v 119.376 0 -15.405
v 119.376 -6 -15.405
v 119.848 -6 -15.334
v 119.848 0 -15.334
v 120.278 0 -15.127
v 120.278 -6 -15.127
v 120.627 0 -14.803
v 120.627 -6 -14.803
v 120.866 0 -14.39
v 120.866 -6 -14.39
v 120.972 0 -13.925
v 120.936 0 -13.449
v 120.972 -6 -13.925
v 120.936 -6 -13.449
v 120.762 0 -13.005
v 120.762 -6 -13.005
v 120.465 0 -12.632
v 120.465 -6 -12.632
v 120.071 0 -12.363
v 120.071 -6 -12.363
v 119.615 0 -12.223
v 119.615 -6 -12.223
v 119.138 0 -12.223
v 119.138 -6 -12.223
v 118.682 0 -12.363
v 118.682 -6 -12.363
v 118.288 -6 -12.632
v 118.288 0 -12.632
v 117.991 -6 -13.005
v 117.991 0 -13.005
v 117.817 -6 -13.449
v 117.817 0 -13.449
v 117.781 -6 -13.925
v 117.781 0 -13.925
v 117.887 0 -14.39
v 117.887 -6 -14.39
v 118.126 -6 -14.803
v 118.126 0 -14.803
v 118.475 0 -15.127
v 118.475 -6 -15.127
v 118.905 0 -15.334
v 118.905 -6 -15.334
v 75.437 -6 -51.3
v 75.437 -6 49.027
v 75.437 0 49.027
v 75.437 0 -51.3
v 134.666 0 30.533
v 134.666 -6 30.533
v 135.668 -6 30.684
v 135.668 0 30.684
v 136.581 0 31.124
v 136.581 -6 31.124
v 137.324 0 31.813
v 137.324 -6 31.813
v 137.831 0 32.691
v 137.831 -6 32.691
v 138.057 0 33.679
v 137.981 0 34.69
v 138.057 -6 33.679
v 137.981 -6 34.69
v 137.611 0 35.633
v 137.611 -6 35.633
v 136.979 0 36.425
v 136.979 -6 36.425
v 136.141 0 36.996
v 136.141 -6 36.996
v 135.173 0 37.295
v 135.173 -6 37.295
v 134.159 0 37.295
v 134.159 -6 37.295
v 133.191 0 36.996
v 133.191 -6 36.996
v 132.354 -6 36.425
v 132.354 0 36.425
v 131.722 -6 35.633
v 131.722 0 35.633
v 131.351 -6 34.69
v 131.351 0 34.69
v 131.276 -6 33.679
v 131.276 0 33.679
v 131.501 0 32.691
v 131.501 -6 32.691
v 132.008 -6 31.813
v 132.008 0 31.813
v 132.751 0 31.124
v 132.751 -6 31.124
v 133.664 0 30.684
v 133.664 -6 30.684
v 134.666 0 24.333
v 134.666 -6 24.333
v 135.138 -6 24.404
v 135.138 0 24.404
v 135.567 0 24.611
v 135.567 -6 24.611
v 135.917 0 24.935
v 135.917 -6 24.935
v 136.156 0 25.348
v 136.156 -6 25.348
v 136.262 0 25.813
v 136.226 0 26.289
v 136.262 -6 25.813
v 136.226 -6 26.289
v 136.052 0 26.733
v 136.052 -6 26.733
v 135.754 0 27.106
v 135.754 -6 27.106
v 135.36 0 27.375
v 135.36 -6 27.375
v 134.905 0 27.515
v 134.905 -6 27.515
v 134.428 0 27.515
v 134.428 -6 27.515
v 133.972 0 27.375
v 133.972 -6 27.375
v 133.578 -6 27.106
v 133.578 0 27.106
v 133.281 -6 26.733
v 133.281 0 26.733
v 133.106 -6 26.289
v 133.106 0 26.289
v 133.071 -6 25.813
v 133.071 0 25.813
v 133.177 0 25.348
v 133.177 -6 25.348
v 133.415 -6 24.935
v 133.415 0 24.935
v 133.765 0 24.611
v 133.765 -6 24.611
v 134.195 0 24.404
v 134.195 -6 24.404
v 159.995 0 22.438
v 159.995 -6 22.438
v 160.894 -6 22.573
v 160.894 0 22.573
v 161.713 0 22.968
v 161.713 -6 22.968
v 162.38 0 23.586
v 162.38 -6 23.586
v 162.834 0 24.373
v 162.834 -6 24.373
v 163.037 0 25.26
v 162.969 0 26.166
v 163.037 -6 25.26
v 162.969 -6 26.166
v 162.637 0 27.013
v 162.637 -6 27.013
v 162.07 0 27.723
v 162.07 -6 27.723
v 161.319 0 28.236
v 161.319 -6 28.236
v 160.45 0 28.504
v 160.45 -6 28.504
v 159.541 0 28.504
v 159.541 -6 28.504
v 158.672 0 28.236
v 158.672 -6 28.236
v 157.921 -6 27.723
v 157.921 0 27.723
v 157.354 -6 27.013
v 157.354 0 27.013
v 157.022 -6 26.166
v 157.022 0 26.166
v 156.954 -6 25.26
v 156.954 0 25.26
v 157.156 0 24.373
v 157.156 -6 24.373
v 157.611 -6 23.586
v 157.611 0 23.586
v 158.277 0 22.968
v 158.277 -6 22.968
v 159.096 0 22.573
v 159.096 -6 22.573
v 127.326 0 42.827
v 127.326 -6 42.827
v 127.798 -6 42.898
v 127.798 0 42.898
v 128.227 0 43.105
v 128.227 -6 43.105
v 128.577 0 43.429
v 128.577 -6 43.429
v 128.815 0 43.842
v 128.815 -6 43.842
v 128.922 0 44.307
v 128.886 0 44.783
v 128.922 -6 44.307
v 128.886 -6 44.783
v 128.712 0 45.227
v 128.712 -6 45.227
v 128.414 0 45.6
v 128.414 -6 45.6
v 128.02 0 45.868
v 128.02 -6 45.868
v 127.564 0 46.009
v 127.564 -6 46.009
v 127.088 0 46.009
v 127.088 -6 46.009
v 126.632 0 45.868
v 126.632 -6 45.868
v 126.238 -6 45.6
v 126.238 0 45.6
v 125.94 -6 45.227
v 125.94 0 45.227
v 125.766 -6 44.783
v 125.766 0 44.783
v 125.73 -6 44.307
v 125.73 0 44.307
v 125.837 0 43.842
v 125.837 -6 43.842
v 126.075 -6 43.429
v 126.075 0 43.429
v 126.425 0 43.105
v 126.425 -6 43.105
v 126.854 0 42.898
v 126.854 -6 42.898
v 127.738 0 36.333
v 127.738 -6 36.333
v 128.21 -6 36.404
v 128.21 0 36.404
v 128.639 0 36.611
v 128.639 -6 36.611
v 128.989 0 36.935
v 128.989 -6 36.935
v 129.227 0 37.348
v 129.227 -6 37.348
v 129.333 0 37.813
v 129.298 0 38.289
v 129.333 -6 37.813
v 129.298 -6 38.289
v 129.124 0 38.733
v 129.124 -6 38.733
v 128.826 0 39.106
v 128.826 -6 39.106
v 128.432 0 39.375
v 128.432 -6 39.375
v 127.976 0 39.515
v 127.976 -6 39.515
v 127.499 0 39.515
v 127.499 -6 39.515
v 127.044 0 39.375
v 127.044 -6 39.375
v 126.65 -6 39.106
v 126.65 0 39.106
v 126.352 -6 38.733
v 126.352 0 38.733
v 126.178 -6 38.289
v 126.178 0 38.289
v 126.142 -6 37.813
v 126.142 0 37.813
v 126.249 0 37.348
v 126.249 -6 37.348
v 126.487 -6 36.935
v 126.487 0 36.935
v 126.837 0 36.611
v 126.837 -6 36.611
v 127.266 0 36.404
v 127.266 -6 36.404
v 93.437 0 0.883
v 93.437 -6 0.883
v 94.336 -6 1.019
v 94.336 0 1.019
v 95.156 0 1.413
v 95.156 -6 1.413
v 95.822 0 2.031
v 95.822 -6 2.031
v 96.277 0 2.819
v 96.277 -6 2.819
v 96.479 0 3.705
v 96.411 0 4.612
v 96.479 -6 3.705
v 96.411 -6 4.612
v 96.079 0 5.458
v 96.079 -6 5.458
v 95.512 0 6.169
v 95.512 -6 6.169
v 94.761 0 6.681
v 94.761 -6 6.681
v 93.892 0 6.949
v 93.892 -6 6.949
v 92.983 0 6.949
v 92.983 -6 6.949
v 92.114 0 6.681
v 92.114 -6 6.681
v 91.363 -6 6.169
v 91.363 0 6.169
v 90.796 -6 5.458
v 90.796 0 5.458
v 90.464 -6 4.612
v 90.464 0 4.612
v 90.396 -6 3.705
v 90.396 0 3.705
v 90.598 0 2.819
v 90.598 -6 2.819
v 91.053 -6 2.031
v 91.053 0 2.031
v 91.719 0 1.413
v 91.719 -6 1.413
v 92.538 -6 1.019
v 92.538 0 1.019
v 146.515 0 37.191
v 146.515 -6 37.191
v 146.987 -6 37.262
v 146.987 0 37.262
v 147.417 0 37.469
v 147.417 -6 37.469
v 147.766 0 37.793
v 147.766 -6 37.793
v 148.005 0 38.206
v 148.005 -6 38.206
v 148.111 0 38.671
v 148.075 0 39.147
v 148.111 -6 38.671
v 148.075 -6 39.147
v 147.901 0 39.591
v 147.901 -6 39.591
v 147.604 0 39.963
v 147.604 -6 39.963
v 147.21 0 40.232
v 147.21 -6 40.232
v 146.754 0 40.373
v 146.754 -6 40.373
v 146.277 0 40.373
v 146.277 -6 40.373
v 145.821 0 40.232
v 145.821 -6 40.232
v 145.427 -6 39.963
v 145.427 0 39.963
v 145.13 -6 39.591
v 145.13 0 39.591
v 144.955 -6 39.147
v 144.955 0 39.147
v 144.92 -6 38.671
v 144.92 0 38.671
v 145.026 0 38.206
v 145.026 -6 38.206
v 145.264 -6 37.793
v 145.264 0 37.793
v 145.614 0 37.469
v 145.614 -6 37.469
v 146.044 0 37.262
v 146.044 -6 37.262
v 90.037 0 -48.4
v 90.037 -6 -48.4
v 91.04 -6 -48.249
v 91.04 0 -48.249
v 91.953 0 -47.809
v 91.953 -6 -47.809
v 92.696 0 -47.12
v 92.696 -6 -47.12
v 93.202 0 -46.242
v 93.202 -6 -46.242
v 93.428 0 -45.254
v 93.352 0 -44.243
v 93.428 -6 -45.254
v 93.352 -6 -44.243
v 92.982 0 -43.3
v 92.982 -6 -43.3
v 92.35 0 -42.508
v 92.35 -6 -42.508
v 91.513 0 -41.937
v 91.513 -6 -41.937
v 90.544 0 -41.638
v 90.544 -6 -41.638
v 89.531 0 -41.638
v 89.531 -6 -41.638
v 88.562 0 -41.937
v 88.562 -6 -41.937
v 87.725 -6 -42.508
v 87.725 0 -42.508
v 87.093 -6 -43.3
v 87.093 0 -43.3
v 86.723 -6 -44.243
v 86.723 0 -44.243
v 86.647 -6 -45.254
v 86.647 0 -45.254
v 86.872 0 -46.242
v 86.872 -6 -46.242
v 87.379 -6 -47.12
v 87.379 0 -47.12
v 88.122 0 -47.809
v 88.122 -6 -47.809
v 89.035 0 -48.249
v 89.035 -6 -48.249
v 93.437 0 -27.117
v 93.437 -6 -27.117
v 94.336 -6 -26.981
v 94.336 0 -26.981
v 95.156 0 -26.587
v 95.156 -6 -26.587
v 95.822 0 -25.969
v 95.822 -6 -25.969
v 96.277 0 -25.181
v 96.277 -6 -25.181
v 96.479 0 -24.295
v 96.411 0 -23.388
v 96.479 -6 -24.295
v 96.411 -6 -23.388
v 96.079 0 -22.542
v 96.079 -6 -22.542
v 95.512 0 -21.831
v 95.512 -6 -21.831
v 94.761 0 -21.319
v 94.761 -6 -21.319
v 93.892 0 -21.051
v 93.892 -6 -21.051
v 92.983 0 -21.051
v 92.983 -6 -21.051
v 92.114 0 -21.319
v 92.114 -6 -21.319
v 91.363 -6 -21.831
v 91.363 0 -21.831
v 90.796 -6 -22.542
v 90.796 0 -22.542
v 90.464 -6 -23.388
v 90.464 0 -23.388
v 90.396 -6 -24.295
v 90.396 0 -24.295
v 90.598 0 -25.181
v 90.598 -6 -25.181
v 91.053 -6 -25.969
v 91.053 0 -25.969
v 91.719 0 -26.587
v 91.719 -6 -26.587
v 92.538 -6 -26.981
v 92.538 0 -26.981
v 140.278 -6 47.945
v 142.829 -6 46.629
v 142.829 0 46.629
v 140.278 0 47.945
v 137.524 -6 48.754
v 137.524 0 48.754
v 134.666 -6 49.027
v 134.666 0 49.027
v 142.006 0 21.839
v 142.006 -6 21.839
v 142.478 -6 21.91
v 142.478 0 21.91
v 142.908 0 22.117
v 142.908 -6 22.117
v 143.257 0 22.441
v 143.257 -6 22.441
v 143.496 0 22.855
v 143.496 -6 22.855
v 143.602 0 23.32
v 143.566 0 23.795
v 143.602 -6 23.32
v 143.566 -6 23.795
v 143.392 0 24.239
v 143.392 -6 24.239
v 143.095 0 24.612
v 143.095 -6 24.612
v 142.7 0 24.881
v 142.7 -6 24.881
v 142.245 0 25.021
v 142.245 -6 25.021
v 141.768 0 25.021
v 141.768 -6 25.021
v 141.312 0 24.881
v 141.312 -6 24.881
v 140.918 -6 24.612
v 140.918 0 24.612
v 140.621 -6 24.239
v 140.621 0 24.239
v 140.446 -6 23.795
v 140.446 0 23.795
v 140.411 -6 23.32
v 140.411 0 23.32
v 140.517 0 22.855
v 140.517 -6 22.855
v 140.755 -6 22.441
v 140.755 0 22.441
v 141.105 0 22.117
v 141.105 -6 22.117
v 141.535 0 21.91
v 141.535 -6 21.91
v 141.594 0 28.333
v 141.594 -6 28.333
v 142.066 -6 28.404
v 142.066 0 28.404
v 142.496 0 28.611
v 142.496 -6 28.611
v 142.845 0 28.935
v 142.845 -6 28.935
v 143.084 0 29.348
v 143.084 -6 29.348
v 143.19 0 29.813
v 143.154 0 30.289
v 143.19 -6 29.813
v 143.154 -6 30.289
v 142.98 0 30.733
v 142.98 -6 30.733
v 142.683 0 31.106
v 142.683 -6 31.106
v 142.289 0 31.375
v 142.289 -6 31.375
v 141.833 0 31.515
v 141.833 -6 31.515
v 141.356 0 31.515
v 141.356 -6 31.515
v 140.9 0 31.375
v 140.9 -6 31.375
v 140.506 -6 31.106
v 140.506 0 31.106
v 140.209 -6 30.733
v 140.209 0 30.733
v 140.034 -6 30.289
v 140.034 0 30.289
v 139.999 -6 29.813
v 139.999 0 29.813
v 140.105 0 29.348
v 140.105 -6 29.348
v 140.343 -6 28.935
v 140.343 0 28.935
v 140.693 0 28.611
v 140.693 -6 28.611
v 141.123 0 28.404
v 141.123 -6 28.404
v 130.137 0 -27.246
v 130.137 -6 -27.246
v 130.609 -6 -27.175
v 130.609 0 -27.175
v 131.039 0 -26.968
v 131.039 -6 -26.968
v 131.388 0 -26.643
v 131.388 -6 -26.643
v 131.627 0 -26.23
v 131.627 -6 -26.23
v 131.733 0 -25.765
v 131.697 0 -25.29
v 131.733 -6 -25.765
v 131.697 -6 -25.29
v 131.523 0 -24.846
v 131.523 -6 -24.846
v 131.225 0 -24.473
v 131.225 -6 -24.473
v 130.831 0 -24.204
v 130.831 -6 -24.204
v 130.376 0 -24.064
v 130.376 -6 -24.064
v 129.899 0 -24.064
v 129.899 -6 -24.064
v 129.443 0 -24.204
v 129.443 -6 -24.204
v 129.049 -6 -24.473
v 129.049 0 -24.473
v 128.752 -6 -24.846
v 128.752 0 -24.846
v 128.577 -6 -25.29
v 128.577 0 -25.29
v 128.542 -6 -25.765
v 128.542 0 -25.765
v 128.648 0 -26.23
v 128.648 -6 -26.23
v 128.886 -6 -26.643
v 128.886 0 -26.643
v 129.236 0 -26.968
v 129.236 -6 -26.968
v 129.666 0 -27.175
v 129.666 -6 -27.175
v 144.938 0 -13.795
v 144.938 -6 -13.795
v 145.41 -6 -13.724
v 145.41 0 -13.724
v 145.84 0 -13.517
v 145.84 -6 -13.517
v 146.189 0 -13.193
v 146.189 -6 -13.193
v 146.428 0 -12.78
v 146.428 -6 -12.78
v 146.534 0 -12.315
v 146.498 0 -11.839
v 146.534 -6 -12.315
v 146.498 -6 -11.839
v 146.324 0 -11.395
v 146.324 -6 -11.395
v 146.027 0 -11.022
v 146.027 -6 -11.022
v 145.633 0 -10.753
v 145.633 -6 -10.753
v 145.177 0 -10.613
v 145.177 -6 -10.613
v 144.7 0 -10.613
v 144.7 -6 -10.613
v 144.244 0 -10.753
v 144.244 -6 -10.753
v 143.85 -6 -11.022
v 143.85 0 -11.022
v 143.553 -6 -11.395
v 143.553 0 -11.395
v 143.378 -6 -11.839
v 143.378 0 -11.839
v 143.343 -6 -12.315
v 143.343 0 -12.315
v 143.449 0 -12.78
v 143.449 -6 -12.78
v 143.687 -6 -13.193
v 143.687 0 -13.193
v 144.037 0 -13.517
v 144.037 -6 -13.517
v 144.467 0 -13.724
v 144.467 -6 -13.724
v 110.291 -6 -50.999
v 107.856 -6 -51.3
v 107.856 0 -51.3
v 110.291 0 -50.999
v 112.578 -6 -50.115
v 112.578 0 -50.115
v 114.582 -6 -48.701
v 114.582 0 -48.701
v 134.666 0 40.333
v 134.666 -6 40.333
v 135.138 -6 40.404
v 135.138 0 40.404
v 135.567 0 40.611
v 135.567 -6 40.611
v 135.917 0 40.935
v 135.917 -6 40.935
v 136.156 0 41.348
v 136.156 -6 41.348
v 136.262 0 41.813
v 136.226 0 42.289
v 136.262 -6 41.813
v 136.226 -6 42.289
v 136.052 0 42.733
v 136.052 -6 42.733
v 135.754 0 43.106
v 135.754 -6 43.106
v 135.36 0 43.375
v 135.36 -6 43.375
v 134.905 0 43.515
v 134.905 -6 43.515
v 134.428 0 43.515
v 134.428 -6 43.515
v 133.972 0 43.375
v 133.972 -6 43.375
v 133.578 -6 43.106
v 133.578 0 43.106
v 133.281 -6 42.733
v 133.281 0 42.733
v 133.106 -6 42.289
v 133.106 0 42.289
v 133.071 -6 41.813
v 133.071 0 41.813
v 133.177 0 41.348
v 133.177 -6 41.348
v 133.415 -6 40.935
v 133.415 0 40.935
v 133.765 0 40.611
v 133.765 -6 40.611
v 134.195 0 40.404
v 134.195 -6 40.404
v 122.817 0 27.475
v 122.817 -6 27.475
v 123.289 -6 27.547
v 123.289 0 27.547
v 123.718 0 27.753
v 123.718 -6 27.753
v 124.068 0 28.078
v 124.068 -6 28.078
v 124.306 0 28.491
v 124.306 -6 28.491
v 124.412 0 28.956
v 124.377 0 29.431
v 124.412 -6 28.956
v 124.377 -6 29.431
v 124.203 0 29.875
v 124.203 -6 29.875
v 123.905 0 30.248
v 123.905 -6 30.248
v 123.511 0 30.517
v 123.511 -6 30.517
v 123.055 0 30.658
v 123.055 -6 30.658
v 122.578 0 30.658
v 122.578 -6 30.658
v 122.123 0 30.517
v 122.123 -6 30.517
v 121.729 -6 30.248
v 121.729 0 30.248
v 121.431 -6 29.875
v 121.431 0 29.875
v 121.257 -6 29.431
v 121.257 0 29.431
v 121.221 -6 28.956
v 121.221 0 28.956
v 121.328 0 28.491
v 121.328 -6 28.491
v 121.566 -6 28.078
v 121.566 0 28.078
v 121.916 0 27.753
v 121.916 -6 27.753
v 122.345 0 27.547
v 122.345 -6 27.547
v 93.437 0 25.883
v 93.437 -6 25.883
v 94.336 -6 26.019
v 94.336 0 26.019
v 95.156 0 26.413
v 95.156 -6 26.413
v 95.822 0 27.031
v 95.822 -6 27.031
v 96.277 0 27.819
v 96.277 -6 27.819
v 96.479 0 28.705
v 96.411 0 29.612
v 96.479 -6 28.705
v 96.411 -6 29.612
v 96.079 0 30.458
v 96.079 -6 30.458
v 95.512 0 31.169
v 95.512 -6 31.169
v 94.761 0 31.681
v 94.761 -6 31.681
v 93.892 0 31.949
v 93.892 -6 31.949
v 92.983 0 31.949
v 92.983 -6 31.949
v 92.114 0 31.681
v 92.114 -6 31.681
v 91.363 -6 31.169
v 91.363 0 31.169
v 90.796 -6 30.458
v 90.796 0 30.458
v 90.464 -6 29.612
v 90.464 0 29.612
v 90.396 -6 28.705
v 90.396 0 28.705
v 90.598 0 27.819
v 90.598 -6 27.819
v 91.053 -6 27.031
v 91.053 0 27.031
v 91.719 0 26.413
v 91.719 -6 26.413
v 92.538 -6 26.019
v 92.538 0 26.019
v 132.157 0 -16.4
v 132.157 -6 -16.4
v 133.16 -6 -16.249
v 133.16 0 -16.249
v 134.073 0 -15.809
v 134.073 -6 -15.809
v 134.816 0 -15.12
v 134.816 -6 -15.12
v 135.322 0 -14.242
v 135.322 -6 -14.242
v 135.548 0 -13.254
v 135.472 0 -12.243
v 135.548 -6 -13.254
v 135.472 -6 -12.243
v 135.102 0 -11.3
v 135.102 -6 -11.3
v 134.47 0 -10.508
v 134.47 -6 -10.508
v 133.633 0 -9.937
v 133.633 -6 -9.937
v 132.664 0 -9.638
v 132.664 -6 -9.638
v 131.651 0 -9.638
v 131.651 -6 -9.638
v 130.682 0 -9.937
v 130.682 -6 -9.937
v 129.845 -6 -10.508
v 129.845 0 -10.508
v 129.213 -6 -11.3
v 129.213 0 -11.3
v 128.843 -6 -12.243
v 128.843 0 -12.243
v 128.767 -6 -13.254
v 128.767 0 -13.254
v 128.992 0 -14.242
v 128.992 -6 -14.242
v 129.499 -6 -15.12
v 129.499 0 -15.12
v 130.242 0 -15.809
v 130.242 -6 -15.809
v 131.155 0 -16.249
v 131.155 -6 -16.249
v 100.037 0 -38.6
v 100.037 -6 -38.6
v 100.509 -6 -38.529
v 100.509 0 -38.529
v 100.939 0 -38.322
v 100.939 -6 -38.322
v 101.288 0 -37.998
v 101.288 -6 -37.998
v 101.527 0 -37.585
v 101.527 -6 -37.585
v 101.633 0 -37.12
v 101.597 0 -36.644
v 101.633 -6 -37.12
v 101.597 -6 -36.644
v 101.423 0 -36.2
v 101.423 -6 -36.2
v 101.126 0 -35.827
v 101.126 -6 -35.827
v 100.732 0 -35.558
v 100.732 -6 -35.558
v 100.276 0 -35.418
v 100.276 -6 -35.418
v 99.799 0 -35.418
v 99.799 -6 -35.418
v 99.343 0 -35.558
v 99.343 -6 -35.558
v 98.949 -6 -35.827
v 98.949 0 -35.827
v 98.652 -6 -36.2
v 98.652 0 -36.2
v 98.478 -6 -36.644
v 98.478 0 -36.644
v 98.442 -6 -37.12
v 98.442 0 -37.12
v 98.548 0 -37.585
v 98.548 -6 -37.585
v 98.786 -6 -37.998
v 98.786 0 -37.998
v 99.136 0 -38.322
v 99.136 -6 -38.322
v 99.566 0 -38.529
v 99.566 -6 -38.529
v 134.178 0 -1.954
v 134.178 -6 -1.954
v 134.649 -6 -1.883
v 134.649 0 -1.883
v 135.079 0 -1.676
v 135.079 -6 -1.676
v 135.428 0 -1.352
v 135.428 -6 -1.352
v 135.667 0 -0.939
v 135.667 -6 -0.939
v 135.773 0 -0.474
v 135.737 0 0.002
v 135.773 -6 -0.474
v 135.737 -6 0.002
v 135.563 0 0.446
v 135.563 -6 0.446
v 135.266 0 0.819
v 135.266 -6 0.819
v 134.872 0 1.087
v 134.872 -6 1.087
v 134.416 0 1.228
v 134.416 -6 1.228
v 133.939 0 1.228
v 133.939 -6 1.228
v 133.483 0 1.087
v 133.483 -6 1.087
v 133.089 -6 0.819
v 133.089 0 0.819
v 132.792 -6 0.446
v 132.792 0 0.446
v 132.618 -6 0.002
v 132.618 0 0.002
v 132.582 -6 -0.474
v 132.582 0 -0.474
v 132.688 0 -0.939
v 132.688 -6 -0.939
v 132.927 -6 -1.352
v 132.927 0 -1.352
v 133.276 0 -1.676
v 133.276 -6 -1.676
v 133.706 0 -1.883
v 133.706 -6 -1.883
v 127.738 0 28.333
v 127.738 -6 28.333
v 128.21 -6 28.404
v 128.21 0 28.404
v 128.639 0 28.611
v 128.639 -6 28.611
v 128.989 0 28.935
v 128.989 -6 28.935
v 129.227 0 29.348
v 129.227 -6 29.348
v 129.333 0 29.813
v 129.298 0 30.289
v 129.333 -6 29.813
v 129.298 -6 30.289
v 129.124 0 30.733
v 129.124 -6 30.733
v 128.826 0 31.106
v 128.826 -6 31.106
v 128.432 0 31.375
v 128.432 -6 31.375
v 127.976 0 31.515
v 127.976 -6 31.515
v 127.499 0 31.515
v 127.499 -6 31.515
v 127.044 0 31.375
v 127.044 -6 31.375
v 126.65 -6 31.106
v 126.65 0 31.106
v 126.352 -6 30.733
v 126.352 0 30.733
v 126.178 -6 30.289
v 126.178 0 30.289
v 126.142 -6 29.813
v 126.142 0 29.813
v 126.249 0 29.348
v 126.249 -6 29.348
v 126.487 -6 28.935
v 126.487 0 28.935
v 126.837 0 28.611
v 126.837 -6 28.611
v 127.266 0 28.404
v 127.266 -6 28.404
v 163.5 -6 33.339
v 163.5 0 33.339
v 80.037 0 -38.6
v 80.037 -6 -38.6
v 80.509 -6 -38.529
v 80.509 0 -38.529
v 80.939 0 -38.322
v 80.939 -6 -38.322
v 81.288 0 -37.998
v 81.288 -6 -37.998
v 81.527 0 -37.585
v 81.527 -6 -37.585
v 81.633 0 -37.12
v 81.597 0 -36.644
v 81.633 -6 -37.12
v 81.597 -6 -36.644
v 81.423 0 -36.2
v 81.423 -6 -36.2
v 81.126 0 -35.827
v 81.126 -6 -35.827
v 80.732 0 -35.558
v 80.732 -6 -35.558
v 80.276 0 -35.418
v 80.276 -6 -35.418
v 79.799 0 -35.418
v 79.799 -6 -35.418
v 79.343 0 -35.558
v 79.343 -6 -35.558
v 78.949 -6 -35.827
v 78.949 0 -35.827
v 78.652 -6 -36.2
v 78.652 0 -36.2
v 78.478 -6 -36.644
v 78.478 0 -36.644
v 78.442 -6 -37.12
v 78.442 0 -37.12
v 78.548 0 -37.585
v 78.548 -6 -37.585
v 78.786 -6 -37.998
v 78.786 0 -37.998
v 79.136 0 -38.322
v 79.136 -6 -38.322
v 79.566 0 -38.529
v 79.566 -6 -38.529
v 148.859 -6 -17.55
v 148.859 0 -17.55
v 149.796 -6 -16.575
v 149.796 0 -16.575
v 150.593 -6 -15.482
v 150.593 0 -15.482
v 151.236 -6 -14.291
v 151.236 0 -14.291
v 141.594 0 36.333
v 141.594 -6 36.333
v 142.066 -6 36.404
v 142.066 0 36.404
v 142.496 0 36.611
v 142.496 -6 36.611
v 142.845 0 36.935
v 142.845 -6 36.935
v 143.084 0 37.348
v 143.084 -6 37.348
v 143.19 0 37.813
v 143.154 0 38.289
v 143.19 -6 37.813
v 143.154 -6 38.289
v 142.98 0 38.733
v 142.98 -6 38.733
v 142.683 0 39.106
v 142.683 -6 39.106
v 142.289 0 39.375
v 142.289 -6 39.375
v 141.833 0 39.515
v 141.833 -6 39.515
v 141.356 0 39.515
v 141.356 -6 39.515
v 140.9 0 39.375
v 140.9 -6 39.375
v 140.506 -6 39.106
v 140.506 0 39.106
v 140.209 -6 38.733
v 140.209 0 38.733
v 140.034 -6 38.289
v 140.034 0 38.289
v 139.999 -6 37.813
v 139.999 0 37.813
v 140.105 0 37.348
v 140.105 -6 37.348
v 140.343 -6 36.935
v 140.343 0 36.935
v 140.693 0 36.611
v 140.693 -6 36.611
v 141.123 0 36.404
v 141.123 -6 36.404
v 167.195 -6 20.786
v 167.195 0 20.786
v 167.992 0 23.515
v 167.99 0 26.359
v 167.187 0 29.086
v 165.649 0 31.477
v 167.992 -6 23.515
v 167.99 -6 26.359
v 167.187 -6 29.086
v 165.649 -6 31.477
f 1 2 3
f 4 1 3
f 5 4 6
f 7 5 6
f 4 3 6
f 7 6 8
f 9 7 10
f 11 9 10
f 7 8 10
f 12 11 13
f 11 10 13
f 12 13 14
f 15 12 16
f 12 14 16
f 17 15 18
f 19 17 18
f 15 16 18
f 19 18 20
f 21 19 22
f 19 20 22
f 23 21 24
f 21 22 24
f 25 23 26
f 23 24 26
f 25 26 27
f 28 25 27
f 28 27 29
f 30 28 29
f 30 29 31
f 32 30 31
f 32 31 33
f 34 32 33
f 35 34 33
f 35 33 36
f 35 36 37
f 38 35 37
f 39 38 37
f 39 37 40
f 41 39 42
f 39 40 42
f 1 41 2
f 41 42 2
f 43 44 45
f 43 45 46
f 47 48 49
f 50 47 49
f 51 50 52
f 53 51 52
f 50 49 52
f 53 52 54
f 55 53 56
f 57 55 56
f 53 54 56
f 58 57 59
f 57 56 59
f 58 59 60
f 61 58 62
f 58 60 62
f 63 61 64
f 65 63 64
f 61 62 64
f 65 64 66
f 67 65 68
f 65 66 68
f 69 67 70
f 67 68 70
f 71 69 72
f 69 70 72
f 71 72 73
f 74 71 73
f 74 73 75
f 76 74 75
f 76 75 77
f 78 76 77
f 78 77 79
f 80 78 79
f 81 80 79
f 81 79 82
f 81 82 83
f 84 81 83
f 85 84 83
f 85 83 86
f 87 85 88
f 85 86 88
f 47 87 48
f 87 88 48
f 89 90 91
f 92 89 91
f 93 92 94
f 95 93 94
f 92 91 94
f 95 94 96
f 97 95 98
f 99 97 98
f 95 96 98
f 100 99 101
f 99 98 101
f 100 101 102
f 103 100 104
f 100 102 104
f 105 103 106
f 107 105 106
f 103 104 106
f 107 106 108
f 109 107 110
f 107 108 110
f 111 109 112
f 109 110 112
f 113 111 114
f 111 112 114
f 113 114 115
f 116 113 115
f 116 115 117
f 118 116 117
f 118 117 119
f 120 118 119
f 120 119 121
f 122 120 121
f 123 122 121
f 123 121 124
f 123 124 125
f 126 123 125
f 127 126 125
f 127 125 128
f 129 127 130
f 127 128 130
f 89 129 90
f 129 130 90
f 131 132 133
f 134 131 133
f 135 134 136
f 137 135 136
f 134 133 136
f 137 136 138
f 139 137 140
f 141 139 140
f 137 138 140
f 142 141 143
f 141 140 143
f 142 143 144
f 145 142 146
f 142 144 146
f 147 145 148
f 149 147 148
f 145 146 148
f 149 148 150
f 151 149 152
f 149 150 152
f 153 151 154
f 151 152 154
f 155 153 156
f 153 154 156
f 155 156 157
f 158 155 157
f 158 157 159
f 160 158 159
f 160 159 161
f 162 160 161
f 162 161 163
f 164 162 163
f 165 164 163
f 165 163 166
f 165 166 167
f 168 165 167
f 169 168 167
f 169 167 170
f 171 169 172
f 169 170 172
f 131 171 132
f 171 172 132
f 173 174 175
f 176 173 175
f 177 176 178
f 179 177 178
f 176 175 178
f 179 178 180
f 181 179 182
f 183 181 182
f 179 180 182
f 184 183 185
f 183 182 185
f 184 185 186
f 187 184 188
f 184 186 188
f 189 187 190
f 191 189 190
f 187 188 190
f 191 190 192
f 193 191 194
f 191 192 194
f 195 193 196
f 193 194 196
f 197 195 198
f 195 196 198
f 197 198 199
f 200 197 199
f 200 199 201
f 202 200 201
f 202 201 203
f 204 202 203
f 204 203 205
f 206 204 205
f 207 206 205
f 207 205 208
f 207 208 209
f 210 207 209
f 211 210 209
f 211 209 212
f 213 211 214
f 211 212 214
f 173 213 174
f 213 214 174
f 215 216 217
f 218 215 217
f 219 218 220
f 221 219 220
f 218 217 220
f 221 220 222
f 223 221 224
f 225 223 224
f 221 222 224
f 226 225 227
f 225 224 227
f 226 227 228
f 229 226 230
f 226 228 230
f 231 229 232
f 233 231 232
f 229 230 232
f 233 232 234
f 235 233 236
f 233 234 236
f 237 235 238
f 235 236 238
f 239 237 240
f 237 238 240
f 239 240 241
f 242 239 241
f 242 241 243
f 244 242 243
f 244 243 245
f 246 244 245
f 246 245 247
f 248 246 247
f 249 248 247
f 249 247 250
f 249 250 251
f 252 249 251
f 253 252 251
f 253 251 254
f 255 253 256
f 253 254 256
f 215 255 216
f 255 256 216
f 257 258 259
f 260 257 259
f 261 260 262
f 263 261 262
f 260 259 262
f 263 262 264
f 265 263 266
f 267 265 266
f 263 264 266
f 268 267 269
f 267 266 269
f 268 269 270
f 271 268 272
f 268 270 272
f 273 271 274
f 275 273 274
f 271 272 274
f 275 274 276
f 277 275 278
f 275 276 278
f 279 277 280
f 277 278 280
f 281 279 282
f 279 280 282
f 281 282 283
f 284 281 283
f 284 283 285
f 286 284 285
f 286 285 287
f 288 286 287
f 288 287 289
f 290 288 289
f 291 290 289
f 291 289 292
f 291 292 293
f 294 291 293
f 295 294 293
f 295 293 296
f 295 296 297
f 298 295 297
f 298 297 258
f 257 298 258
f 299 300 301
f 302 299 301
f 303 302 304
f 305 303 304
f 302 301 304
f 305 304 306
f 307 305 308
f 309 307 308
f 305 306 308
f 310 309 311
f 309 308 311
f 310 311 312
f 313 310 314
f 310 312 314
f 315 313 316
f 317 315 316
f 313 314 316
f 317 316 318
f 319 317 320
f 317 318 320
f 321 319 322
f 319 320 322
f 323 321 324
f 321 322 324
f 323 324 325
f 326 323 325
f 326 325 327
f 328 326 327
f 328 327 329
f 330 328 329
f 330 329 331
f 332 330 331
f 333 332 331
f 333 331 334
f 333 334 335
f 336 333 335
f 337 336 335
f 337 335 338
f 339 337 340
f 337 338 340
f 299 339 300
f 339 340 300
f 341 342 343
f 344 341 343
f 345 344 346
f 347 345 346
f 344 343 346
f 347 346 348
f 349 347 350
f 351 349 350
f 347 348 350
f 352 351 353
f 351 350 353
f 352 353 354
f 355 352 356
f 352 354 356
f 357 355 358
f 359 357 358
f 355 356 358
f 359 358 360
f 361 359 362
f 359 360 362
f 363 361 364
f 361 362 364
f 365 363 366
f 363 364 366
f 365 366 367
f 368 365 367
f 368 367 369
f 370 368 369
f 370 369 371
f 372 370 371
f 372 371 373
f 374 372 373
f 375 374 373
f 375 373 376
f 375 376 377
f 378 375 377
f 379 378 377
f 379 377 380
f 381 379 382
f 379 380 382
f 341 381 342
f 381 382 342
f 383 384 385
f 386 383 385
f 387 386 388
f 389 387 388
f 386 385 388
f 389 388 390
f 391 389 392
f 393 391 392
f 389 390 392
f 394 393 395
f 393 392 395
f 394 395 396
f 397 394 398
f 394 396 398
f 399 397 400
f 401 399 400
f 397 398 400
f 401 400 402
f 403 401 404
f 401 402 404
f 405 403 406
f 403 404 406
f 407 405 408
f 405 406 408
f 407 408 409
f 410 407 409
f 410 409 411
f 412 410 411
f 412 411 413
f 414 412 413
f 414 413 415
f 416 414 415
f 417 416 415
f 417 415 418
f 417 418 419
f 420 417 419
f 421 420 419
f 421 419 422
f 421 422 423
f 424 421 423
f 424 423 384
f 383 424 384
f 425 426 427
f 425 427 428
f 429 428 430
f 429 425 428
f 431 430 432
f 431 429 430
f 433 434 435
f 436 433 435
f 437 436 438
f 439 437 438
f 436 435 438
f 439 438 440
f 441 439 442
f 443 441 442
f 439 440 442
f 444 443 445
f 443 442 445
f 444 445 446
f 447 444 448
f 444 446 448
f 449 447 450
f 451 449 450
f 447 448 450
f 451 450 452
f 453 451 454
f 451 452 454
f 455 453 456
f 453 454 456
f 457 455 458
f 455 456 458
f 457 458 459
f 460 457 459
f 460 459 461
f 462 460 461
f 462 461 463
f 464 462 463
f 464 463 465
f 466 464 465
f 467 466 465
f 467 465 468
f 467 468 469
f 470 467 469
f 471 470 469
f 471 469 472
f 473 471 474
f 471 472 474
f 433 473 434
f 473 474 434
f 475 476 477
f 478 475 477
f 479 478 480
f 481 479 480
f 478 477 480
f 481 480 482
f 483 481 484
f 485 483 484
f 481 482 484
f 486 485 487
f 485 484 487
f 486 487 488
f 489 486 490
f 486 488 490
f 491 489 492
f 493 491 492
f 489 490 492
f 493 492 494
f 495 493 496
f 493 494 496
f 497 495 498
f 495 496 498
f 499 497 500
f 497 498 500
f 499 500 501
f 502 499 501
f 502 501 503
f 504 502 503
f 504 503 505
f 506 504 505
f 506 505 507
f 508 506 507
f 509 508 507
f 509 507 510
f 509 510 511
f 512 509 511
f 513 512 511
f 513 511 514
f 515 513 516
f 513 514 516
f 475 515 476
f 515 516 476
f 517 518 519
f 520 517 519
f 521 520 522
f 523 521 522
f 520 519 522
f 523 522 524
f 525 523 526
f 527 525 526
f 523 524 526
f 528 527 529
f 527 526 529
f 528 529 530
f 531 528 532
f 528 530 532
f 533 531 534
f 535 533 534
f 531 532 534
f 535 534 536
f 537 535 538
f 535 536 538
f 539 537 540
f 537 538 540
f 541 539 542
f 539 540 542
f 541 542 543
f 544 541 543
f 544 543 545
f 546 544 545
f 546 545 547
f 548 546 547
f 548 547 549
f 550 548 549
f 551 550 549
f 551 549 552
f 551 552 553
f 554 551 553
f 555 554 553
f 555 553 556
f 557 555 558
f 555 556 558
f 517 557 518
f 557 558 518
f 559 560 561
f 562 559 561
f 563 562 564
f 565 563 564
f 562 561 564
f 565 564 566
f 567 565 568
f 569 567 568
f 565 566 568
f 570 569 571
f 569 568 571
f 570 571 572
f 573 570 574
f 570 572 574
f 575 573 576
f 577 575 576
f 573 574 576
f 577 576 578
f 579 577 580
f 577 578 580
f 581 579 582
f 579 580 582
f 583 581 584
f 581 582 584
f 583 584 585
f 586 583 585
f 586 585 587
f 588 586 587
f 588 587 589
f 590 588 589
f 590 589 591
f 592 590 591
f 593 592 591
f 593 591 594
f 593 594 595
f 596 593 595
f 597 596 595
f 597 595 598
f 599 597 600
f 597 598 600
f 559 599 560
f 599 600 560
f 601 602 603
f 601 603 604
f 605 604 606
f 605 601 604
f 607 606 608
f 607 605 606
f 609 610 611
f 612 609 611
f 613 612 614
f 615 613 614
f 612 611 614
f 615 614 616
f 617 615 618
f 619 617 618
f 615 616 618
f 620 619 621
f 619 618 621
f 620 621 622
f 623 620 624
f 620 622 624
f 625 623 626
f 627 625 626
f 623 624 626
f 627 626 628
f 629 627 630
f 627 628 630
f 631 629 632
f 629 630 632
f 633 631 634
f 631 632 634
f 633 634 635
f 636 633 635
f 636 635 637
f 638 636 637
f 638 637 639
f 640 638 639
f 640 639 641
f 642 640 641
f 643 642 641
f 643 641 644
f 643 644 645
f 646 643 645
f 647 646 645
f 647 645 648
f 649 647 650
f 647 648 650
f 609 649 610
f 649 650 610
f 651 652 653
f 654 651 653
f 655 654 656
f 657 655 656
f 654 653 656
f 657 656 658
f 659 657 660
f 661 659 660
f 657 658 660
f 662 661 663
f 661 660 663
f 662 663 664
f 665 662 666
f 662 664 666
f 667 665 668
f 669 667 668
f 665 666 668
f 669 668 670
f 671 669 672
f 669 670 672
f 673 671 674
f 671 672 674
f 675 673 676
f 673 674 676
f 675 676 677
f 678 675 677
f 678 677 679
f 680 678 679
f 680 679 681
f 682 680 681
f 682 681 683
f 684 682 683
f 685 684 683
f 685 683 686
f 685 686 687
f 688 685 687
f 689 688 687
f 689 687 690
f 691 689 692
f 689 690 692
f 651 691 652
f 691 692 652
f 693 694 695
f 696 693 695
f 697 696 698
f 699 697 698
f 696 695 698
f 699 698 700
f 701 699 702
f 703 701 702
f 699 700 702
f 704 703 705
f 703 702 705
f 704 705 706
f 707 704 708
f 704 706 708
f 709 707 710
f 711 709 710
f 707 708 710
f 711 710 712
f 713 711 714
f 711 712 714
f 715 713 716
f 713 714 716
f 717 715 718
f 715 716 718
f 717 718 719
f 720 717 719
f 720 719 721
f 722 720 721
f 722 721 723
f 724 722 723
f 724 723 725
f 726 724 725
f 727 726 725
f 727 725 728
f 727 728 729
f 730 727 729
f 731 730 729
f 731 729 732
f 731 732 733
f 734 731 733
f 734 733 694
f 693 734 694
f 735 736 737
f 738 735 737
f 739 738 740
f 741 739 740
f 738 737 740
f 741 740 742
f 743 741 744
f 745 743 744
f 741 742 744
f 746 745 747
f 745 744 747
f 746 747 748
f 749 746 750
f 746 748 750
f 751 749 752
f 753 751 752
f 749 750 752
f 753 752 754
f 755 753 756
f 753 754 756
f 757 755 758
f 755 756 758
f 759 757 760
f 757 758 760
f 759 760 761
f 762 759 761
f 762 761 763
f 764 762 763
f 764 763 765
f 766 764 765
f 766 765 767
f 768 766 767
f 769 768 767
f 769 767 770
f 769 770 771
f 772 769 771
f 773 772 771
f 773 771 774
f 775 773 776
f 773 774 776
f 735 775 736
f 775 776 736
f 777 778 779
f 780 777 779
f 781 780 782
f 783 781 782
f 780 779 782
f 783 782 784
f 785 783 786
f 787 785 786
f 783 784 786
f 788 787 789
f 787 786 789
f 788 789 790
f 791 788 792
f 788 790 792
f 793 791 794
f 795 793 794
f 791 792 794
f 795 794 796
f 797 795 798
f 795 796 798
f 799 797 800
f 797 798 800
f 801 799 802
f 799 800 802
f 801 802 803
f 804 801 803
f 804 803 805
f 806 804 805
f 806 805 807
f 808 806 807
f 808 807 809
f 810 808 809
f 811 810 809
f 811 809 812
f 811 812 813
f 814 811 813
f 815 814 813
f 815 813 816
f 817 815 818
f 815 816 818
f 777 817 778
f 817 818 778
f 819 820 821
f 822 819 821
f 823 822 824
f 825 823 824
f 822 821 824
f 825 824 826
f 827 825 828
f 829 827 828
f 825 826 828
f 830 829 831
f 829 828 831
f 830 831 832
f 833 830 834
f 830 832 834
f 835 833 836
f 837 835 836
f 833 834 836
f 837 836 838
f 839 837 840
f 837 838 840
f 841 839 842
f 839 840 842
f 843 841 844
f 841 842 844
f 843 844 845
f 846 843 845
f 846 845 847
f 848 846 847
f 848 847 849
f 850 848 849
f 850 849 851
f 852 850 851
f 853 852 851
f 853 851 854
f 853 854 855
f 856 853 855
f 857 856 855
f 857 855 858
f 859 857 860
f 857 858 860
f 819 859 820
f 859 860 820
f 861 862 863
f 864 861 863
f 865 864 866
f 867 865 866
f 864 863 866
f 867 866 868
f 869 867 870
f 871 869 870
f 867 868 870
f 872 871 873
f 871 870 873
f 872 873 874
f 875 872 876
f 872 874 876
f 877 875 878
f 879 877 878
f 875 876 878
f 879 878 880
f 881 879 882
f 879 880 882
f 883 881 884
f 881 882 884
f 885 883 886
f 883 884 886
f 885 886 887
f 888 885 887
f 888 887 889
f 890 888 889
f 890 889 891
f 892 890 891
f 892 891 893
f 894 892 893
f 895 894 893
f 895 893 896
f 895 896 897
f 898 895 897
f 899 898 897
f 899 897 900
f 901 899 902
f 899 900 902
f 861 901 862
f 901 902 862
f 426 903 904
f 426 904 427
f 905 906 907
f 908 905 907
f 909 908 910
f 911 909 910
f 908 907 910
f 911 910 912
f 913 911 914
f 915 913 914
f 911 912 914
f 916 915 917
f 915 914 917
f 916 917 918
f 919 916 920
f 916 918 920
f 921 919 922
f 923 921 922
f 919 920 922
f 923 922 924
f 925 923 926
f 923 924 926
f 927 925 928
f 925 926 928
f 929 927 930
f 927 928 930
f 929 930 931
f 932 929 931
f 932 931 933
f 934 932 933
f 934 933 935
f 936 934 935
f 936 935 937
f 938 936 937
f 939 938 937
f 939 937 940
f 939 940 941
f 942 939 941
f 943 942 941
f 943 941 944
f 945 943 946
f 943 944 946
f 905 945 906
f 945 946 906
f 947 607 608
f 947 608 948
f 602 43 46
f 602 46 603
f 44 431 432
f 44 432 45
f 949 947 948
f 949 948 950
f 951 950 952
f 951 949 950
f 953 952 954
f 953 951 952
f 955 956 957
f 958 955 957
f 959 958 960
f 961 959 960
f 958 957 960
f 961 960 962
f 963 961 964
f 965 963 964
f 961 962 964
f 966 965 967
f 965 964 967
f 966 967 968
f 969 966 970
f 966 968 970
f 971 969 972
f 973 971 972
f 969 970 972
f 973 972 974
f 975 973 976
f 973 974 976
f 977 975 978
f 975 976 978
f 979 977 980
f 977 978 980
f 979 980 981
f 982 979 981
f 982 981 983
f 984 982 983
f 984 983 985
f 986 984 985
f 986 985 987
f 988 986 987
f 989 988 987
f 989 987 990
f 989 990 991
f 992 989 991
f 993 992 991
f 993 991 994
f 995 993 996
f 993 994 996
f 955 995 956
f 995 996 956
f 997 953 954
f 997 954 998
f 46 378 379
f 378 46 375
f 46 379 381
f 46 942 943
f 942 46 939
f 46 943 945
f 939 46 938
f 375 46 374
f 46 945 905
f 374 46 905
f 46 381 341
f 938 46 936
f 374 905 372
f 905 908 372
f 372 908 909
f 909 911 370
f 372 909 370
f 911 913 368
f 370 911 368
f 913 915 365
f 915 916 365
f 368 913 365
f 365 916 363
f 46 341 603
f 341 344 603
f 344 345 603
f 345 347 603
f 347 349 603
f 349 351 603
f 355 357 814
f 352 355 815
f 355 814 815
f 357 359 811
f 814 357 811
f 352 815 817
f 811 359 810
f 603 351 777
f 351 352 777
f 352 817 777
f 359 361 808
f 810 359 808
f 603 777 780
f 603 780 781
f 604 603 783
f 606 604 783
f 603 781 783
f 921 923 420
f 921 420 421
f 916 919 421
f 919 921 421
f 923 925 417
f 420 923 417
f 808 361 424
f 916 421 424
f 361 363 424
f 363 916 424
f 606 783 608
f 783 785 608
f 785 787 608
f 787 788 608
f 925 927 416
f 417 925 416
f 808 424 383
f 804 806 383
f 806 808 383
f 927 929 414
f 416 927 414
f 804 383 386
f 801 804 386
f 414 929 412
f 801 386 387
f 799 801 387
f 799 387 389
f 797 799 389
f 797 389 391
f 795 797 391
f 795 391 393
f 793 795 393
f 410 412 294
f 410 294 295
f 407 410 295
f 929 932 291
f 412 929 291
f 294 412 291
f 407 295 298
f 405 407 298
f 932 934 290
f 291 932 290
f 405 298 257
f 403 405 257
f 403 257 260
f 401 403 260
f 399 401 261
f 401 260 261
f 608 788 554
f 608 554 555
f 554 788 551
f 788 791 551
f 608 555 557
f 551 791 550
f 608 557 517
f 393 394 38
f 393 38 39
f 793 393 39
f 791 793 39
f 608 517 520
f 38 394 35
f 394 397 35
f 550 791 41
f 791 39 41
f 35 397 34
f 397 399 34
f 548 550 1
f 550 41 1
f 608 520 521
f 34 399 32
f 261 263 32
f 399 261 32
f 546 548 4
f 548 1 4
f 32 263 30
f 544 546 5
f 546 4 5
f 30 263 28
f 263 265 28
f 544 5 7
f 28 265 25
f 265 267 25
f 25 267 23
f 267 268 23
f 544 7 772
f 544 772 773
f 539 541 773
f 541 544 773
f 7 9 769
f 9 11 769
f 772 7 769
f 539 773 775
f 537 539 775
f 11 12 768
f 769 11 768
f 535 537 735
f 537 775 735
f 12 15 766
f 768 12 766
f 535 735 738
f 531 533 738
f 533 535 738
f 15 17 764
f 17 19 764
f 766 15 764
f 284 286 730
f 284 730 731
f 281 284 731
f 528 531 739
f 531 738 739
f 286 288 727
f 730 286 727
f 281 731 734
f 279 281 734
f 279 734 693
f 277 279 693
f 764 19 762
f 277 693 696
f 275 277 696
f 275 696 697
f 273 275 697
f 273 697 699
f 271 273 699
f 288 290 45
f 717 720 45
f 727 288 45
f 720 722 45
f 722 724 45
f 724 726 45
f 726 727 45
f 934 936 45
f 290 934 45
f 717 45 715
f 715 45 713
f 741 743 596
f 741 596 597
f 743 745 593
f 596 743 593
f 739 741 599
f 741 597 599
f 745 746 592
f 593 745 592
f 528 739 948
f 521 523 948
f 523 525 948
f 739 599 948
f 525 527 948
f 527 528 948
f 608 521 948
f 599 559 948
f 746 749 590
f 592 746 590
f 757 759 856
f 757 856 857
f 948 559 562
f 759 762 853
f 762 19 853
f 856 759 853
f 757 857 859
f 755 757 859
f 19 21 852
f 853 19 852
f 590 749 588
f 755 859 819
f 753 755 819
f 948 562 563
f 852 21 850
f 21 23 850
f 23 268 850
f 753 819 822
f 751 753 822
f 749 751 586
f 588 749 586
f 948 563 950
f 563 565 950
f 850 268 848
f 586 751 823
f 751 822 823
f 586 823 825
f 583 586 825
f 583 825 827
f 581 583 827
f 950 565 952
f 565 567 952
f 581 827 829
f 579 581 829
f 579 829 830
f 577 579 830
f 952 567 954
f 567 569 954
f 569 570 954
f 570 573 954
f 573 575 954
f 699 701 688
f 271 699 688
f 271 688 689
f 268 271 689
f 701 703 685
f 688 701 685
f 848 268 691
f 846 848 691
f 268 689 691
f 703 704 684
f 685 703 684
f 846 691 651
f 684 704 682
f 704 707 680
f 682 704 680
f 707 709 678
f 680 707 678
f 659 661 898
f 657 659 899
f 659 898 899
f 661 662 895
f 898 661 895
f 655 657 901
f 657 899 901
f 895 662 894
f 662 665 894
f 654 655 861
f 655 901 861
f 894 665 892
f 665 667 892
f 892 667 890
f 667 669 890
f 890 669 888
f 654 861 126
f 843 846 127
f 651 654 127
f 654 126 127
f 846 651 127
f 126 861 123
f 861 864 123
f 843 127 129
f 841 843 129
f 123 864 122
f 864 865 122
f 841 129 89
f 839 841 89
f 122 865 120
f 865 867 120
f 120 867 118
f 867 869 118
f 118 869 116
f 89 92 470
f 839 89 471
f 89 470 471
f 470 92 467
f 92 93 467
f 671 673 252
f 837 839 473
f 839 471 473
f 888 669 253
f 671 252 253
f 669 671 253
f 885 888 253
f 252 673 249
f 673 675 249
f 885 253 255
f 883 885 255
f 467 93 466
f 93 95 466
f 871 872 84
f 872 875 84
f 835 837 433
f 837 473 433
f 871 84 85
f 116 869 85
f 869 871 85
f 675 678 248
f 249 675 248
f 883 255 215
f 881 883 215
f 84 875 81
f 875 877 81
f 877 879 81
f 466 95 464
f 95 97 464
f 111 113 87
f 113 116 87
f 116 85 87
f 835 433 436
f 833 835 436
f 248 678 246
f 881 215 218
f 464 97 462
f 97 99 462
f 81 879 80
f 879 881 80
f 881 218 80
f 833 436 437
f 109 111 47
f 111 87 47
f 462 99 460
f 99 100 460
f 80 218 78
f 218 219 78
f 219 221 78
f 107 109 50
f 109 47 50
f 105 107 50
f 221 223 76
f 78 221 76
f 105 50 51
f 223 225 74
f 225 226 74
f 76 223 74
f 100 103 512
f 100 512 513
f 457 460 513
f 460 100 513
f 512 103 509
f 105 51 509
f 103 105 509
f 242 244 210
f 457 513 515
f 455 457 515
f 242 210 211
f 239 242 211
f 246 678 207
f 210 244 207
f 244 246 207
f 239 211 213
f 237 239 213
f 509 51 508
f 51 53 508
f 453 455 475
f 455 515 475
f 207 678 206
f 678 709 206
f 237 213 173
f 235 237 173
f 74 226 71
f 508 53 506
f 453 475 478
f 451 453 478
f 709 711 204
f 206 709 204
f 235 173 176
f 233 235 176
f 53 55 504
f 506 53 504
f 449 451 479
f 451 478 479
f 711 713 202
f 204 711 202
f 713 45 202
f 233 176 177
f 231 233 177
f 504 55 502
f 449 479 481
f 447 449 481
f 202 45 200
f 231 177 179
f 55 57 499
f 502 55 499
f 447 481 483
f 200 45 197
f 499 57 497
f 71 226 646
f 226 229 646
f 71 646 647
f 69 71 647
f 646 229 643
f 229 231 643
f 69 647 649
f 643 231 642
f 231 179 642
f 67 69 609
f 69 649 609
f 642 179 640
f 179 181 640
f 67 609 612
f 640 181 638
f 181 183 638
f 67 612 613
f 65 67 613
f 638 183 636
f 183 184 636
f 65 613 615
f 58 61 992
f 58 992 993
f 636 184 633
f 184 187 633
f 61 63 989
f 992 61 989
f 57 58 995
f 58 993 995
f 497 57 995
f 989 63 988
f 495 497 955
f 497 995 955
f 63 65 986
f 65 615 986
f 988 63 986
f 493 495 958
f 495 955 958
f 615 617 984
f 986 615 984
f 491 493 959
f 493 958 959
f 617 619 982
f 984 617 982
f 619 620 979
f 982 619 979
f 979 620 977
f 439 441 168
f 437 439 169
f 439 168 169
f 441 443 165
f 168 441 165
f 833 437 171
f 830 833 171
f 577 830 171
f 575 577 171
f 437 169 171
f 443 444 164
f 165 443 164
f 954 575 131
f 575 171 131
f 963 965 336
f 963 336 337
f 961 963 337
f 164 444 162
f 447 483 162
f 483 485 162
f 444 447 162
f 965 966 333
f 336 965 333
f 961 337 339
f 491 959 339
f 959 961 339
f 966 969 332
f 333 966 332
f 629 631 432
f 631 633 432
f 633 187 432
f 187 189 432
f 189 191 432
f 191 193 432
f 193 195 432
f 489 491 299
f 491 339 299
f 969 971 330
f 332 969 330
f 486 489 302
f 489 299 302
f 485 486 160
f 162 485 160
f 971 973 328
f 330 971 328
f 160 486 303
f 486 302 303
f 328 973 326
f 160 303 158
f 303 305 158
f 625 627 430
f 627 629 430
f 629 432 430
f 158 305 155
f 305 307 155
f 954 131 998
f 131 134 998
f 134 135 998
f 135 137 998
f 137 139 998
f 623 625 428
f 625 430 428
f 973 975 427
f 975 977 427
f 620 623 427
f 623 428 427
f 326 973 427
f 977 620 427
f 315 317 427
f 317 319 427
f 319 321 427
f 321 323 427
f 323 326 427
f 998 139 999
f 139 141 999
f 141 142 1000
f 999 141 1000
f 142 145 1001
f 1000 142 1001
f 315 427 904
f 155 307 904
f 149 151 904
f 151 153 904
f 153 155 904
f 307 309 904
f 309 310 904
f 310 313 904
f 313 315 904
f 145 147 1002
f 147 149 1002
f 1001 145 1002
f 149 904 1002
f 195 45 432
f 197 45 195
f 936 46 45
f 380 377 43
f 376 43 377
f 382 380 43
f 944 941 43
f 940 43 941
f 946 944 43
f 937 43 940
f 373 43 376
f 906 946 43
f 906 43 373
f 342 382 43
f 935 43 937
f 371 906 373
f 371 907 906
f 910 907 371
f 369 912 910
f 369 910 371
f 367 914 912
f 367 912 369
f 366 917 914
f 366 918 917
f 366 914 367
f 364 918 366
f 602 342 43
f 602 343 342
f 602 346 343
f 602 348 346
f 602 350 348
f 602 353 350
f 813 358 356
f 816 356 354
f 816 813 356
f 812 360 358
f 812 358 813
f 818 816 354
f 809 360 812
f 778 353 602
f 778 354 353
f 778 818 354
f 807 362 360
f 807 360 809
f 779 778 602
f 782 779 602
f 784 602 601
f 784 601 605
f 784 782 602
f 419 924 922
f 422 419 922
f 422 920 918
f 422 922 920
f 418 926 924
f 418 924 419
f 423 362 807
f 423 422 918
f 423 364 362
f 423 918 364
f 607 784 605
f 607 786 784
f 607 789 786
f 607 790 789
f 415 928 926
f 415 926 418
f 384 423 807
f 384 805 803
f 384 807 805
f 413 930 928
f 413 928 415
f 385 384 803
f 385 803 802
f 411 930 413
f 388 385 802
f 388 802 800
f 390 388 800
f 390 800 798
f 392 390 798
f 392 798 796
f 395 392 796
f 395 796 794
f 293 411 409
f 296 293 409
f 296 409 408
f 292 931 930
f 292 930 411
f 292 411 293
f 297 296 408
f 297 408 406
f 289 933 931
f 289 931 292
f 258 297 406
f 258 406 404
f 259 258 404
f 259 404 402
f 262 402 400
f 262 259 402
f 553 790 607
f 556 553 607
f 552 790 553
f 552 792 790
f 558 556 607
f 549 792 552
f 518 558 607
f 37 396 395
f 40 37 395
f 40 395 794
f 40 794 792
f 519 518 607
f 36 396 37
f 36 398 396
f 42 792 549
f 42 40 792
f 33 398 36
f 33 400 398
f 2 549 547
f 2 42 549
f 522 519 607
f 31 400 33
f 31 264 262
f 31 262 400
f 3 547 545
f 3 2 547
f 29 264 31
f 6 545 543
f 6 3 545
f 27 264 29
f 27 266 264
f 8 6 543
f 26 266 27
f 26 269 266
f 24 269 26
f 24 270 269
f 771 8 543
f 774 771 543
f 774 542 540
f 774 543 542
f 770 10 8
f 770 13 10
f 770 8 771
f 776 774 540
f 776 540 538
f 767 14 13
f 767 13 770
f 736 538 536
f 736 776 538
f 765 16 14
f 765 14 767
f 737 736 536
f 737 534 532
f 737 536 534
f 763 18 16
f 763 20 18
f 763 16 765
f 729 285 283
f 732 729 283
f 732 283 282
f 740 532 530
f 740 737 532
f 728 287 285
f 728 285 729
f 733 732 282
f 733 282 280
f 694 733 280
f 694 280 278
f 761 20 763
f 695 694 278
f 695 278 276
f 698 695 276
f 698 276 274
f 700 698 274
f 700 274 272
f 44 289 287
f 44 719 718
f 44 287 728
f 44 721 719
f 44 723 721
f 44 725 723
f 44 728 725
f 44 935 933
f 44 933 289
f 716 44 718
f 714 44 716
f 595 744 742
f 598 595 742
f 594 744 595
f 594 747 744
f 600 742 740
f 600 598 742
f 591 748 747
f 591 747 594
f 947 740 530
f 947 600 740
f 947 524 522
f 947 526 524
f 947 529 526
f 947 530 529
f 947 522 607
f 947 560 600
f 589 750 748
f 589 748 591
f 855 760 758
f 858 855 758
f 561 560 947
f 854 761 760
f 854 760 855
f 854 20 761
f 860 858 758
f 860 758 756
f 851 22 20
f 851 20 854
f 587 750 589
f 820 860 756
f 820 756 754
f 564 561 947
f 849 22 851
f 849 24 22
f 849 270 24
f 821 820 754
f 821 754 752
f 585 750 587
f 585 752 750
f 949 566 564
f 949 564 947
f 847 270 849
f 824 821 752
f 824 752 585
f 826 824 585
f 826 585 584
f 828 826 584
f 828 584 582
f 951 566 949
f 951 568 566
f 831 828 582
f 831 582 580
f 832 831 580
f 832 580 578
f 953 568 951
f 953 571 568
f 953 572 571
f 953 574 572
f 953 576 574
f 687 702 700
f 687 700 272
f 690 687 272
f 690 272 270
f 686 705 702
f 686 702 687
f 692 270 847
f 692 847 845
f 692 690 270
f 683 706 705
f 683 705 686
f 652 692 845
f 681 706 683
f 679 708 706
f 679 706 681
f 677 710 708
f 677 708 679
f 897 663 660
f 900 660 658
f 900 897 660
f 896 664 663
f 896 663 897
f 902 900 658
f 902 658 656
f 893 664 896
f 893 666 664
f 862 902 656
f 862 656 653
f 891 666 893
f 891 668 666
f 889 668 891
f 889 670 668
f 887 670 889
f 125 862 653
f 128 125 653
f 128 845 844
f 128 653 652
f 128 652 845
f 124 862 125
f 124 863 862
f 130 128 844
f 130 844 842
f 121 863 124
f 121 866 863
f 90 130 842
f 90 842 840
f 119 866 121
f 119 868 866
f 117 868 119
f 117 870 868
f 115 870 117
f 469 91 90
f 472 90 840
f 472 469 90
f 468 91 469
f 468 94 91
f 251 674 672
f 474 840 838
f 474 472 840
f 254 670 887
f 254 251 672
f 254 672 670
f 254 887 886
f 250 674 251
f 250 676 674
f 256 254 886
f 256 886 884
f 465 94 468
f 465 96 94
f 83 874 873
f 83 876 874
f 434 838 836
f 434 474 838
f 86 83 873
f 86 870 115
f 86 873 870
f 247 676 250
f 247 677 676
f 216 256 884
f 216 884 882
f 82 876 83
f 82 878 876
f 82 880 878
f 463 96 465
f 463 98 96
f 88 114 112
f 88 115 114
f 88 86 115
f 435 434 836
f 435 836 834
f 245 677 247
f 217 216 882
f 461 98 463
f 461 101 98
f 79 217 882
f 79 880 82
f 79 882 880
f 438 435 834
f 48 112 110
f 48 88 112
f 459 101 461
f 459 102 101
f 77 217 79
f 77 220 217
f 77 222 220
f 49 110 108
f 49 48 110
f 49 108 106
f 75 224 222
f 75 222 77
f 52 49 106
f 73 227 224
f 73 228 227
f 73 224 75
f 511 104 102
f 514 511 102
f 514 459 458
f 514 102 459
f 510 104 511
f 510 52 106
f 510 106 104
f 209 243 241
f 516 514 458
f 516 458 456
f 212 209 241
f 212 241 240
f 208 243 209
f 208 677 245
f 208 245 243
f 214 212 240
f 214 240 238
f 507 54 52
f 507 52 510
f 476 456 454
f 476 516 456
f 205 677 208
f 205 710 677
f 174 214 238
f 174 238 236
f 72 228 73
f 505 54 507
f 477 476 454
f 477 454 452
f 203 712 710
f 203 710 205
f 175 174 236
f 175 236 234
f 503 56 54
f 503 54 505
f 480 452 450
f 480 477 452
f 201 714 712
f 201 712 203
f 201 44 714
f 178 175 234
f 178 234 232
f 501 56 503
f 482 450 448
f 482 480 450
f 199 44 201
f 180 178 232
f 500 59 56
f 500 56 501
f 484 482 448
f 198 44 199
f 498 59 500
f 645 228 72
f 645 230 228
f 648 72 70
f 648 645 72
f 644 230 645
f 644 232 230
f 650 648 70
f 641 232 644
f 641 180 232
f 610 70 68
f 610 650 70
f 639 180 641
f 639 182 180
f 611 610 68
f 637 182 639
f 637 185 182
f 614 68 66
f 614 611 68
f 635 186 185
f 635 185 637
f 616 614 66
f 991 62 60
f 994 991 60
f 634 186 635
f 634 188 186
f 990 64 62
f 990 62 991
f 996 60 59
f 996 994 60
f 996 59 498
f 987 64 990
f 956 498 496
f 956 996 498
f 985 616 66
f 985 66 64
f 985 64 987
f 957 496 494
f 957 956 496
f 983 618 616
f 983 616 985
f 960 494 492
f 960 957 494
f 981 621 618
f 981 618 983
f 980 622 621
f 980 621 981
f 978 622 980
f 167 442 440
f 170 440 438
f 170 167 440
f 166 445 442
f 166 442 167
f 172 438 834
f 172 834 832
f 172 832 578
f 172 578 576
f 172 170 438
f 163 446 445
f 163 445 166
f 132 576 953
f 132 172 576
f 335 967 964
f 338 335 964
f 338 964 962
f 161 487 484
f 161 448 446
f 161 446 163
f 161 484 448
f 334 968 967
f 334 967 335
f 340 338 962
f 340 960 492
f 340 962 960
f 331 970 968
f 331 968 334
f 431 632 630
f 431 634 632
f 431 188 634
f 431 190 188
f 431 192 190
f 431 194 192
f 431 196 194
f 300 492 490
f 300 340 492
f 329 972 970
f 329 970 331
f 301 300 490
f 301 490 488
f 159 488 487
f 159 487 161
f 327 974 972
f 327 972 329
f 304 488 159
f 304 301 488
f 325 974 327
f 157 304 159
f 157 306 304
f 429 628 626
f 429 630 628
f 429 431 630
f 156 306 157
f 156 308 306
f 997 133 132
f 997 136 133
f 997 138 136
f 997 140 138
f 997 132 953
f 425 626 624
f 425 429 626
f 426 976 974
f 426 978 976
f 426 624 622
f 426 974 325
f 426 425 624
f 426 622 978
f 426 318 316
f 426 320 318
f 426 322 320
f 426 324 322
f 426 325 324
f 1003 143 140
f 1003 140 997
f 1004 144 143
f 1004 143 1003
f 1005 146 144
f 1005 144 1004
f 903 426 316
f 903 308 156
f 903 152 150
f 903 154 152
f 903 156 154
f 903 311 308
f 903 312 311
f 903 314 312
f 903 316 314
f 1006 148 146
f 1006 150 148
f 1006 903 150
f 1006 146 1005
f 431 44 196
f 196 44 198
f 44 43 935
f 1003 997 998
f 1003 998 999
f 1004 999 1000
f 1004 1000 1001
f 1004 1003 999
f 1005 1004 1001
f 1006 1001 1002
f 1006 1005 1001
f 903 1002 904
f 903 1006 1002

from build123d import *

# Parameters (mm, degrees)
ESBO_O1_R                = 3.4
ESBO_O1_R_2              = 1.6
ESBO_O1_R_3              = 3.05
RESSALTO_EXTRUS_O1_DEPTH = 6
ESBO_O2_R                = 3.05
CORTE_EXTRUS_O1_DEPTH    = 10


with BuildPart() as part:
    # Esboço1 → Ressalto-extrusão1 (new body)
    with BuildSketch(Plane.XZ.offset(6)):
        with BuildLine():
            ThreePointArc((148.858963728, -17.550205761), (150.213387743, -16.041631797), (151.235707119, -14.290882553))
            Line((151.235707119, -14.290882553), (167.194797105, 20.786465148))
            ThreePointArc((167.194797105, 20.786465148), (167.685761217, 27.75097204), (163.500492356, 33.339256802))
            Line((163.500492356, 33.339256802), (142.828800476, 46.629357452))
            ThreePointArc((142.828800476, 46.629357452), (138.919886426, 48.415130742), (134.666145804, 49.026919929))
            Line((134.666145804, 49.026919929), (75.43742995, 49.026919929))
            Line((75.43742995, 49.026919929), (75.43742995, -51.3))
            Line((75.43742995, -51.3), (107.856417314, -51.3))
            ThreePointArc((107.856417314, -51.3), (111.461591333, -50.627524875), (114.581887382, -48.700544058))
            Line((114.581887382, -48.700544058), (148.858963728, -17.550205761))
        make_face()
        with Locations(Location((90.03742995, -45, 0), (0, 0, 270))):
            Circle(ESBO_O1_R, mode=Mode.SUBTRACT)
        with Locations(Location((80.03742995, -37, 0), (0, 0, 270))):
            Circle(ESBO_O1_R_2, mode=Mode.SUBTRACT)
        with Locations(Location((100.03742995, -37, 0), (0, 0, 270))):
            Circle(ESBO_O1_R_2, mode=Mode.SUBTRACT)
        with Locations(Location((119.376459837, -13.805034822, 0), (0, 0, 270))):
            Circle(ESBO_O1_R_2, mode=Mode.SUBTRACT)
        with Locations(Location((130.137211947, -25.645905315, 0), (0, 0, 270))):
            Circle(ESBO_O1_R_2, mode=Mode.SUBTRACT)
        with Locations(Location((132.15737995, -13, 0), (0, 0, 270))):
            Circle(ESBO_O1_R, mode=Mode.SUBTRACT)
        with Locations(Location((144.938300063, -12.194965178, 0), (0, 0, 270))):
            Circle(ESBO_O1_R_2, mode=Mode.SUBTRACT)
        with Locations(Location((134.177547953, -0.354094685, 0), (0, 0, 270))):
            Circle(ESBO_O1_R_2, mode=Mode.SUBTRACT)
        with Locations(Location((122.816922322, 29.075437545, 0), (0, 0, 270))):
            Circle(ESBO_O1_R_2, mode=Mode.SUBTRACT)
        with Locations(Location((127.737942574, 29.932998956, 0), (0, 0, 270))):
            Circle(ESBO_O1_R_2, mode=Mode.SUBTRACT)
        with Locations(Location((134.666145804, 25.932998956, 0), (0, 0, 270))):
            Circle(ESBO_O1_R_2, mode=Mode.SUBTRACT)
        with Locations(Location((142.006279165, 23.439074893, 0), (0, 0, 270))):
            Circle(ESBO_O1_R_2, mode=Mode.SUBTRACT)
        with Locations(Location((134.666145804, 33.932998956, 0), (0, 0, 270))):
            Circle(ESBO_O1_R, mode=Mode.SUBTRACT)
        with Locations(Location((141.594349035, 29.932998956, 0), (0, 0, 270))):
            Circle(ESBO_O1_R_2, mode=Mode.SUBTRACT)
        with Locations(Location((127.737942574, 37.932998956, 0), (0, 0, 270))):
            Circle(ESBO_O1_R_2, mode=Mode.SUBTRACT)
        with Locations(Location((127.326012444, 44.426923019, 0), (0, 0, 270))):
            Circle(ESBO_O1_R_2, mode=Mode.SUBTRACT)
        with Locations(Location((134.666145804, 41.932998956, 0), (0, 0, 270))):
            Circle(ESBO_O1_R_2, mode=Mode.SUBTRACT)
        with Locations(Location((141.594349035, 37.932998956, 0), (0, 0, 270))):
            Circle(ESBO_O1_R_2, mode=Mode.SUBTRACT)
        with Locations(Location((159.995303964, 25.487660186, 0), (0, 0, 270))):
            Circle(ESBO_O1_R_3, mode=Mode.SUBTRACT)
        with Locations(Location((146.515369287, 38.790560368, 0), (0, 0, 270))):
            Circle(ESBO_O1_R_2, mode=Mode.SUBTRACT)
    extrude(amount=-RESSALTO_EXTRUS_O1_DEPTH)

    # Esboço2 → Corte-extrusão1 (cut)
    with BuildSketch(Plane.XZ.offset(6)):
        with Locations(Location((93.43742995, -24.067001044, 0), (0, 0, 270))):
            Circle(ESBO_O2_R)
        with Locations(Location((93.43742995, 3.932998956, 0), (0, 0, 270))):
            Circle(ESBO_O2_R)
        with Locations(Location((93.43742995, 28.932998956, 0), (0, 0, 270))):
            Circle(ESBO_O2_R)
    extrude(amount=-CORTE_EXTRUS_O1_DEPTH, mode=Mode.SUBTRACT)


solid = part.part
